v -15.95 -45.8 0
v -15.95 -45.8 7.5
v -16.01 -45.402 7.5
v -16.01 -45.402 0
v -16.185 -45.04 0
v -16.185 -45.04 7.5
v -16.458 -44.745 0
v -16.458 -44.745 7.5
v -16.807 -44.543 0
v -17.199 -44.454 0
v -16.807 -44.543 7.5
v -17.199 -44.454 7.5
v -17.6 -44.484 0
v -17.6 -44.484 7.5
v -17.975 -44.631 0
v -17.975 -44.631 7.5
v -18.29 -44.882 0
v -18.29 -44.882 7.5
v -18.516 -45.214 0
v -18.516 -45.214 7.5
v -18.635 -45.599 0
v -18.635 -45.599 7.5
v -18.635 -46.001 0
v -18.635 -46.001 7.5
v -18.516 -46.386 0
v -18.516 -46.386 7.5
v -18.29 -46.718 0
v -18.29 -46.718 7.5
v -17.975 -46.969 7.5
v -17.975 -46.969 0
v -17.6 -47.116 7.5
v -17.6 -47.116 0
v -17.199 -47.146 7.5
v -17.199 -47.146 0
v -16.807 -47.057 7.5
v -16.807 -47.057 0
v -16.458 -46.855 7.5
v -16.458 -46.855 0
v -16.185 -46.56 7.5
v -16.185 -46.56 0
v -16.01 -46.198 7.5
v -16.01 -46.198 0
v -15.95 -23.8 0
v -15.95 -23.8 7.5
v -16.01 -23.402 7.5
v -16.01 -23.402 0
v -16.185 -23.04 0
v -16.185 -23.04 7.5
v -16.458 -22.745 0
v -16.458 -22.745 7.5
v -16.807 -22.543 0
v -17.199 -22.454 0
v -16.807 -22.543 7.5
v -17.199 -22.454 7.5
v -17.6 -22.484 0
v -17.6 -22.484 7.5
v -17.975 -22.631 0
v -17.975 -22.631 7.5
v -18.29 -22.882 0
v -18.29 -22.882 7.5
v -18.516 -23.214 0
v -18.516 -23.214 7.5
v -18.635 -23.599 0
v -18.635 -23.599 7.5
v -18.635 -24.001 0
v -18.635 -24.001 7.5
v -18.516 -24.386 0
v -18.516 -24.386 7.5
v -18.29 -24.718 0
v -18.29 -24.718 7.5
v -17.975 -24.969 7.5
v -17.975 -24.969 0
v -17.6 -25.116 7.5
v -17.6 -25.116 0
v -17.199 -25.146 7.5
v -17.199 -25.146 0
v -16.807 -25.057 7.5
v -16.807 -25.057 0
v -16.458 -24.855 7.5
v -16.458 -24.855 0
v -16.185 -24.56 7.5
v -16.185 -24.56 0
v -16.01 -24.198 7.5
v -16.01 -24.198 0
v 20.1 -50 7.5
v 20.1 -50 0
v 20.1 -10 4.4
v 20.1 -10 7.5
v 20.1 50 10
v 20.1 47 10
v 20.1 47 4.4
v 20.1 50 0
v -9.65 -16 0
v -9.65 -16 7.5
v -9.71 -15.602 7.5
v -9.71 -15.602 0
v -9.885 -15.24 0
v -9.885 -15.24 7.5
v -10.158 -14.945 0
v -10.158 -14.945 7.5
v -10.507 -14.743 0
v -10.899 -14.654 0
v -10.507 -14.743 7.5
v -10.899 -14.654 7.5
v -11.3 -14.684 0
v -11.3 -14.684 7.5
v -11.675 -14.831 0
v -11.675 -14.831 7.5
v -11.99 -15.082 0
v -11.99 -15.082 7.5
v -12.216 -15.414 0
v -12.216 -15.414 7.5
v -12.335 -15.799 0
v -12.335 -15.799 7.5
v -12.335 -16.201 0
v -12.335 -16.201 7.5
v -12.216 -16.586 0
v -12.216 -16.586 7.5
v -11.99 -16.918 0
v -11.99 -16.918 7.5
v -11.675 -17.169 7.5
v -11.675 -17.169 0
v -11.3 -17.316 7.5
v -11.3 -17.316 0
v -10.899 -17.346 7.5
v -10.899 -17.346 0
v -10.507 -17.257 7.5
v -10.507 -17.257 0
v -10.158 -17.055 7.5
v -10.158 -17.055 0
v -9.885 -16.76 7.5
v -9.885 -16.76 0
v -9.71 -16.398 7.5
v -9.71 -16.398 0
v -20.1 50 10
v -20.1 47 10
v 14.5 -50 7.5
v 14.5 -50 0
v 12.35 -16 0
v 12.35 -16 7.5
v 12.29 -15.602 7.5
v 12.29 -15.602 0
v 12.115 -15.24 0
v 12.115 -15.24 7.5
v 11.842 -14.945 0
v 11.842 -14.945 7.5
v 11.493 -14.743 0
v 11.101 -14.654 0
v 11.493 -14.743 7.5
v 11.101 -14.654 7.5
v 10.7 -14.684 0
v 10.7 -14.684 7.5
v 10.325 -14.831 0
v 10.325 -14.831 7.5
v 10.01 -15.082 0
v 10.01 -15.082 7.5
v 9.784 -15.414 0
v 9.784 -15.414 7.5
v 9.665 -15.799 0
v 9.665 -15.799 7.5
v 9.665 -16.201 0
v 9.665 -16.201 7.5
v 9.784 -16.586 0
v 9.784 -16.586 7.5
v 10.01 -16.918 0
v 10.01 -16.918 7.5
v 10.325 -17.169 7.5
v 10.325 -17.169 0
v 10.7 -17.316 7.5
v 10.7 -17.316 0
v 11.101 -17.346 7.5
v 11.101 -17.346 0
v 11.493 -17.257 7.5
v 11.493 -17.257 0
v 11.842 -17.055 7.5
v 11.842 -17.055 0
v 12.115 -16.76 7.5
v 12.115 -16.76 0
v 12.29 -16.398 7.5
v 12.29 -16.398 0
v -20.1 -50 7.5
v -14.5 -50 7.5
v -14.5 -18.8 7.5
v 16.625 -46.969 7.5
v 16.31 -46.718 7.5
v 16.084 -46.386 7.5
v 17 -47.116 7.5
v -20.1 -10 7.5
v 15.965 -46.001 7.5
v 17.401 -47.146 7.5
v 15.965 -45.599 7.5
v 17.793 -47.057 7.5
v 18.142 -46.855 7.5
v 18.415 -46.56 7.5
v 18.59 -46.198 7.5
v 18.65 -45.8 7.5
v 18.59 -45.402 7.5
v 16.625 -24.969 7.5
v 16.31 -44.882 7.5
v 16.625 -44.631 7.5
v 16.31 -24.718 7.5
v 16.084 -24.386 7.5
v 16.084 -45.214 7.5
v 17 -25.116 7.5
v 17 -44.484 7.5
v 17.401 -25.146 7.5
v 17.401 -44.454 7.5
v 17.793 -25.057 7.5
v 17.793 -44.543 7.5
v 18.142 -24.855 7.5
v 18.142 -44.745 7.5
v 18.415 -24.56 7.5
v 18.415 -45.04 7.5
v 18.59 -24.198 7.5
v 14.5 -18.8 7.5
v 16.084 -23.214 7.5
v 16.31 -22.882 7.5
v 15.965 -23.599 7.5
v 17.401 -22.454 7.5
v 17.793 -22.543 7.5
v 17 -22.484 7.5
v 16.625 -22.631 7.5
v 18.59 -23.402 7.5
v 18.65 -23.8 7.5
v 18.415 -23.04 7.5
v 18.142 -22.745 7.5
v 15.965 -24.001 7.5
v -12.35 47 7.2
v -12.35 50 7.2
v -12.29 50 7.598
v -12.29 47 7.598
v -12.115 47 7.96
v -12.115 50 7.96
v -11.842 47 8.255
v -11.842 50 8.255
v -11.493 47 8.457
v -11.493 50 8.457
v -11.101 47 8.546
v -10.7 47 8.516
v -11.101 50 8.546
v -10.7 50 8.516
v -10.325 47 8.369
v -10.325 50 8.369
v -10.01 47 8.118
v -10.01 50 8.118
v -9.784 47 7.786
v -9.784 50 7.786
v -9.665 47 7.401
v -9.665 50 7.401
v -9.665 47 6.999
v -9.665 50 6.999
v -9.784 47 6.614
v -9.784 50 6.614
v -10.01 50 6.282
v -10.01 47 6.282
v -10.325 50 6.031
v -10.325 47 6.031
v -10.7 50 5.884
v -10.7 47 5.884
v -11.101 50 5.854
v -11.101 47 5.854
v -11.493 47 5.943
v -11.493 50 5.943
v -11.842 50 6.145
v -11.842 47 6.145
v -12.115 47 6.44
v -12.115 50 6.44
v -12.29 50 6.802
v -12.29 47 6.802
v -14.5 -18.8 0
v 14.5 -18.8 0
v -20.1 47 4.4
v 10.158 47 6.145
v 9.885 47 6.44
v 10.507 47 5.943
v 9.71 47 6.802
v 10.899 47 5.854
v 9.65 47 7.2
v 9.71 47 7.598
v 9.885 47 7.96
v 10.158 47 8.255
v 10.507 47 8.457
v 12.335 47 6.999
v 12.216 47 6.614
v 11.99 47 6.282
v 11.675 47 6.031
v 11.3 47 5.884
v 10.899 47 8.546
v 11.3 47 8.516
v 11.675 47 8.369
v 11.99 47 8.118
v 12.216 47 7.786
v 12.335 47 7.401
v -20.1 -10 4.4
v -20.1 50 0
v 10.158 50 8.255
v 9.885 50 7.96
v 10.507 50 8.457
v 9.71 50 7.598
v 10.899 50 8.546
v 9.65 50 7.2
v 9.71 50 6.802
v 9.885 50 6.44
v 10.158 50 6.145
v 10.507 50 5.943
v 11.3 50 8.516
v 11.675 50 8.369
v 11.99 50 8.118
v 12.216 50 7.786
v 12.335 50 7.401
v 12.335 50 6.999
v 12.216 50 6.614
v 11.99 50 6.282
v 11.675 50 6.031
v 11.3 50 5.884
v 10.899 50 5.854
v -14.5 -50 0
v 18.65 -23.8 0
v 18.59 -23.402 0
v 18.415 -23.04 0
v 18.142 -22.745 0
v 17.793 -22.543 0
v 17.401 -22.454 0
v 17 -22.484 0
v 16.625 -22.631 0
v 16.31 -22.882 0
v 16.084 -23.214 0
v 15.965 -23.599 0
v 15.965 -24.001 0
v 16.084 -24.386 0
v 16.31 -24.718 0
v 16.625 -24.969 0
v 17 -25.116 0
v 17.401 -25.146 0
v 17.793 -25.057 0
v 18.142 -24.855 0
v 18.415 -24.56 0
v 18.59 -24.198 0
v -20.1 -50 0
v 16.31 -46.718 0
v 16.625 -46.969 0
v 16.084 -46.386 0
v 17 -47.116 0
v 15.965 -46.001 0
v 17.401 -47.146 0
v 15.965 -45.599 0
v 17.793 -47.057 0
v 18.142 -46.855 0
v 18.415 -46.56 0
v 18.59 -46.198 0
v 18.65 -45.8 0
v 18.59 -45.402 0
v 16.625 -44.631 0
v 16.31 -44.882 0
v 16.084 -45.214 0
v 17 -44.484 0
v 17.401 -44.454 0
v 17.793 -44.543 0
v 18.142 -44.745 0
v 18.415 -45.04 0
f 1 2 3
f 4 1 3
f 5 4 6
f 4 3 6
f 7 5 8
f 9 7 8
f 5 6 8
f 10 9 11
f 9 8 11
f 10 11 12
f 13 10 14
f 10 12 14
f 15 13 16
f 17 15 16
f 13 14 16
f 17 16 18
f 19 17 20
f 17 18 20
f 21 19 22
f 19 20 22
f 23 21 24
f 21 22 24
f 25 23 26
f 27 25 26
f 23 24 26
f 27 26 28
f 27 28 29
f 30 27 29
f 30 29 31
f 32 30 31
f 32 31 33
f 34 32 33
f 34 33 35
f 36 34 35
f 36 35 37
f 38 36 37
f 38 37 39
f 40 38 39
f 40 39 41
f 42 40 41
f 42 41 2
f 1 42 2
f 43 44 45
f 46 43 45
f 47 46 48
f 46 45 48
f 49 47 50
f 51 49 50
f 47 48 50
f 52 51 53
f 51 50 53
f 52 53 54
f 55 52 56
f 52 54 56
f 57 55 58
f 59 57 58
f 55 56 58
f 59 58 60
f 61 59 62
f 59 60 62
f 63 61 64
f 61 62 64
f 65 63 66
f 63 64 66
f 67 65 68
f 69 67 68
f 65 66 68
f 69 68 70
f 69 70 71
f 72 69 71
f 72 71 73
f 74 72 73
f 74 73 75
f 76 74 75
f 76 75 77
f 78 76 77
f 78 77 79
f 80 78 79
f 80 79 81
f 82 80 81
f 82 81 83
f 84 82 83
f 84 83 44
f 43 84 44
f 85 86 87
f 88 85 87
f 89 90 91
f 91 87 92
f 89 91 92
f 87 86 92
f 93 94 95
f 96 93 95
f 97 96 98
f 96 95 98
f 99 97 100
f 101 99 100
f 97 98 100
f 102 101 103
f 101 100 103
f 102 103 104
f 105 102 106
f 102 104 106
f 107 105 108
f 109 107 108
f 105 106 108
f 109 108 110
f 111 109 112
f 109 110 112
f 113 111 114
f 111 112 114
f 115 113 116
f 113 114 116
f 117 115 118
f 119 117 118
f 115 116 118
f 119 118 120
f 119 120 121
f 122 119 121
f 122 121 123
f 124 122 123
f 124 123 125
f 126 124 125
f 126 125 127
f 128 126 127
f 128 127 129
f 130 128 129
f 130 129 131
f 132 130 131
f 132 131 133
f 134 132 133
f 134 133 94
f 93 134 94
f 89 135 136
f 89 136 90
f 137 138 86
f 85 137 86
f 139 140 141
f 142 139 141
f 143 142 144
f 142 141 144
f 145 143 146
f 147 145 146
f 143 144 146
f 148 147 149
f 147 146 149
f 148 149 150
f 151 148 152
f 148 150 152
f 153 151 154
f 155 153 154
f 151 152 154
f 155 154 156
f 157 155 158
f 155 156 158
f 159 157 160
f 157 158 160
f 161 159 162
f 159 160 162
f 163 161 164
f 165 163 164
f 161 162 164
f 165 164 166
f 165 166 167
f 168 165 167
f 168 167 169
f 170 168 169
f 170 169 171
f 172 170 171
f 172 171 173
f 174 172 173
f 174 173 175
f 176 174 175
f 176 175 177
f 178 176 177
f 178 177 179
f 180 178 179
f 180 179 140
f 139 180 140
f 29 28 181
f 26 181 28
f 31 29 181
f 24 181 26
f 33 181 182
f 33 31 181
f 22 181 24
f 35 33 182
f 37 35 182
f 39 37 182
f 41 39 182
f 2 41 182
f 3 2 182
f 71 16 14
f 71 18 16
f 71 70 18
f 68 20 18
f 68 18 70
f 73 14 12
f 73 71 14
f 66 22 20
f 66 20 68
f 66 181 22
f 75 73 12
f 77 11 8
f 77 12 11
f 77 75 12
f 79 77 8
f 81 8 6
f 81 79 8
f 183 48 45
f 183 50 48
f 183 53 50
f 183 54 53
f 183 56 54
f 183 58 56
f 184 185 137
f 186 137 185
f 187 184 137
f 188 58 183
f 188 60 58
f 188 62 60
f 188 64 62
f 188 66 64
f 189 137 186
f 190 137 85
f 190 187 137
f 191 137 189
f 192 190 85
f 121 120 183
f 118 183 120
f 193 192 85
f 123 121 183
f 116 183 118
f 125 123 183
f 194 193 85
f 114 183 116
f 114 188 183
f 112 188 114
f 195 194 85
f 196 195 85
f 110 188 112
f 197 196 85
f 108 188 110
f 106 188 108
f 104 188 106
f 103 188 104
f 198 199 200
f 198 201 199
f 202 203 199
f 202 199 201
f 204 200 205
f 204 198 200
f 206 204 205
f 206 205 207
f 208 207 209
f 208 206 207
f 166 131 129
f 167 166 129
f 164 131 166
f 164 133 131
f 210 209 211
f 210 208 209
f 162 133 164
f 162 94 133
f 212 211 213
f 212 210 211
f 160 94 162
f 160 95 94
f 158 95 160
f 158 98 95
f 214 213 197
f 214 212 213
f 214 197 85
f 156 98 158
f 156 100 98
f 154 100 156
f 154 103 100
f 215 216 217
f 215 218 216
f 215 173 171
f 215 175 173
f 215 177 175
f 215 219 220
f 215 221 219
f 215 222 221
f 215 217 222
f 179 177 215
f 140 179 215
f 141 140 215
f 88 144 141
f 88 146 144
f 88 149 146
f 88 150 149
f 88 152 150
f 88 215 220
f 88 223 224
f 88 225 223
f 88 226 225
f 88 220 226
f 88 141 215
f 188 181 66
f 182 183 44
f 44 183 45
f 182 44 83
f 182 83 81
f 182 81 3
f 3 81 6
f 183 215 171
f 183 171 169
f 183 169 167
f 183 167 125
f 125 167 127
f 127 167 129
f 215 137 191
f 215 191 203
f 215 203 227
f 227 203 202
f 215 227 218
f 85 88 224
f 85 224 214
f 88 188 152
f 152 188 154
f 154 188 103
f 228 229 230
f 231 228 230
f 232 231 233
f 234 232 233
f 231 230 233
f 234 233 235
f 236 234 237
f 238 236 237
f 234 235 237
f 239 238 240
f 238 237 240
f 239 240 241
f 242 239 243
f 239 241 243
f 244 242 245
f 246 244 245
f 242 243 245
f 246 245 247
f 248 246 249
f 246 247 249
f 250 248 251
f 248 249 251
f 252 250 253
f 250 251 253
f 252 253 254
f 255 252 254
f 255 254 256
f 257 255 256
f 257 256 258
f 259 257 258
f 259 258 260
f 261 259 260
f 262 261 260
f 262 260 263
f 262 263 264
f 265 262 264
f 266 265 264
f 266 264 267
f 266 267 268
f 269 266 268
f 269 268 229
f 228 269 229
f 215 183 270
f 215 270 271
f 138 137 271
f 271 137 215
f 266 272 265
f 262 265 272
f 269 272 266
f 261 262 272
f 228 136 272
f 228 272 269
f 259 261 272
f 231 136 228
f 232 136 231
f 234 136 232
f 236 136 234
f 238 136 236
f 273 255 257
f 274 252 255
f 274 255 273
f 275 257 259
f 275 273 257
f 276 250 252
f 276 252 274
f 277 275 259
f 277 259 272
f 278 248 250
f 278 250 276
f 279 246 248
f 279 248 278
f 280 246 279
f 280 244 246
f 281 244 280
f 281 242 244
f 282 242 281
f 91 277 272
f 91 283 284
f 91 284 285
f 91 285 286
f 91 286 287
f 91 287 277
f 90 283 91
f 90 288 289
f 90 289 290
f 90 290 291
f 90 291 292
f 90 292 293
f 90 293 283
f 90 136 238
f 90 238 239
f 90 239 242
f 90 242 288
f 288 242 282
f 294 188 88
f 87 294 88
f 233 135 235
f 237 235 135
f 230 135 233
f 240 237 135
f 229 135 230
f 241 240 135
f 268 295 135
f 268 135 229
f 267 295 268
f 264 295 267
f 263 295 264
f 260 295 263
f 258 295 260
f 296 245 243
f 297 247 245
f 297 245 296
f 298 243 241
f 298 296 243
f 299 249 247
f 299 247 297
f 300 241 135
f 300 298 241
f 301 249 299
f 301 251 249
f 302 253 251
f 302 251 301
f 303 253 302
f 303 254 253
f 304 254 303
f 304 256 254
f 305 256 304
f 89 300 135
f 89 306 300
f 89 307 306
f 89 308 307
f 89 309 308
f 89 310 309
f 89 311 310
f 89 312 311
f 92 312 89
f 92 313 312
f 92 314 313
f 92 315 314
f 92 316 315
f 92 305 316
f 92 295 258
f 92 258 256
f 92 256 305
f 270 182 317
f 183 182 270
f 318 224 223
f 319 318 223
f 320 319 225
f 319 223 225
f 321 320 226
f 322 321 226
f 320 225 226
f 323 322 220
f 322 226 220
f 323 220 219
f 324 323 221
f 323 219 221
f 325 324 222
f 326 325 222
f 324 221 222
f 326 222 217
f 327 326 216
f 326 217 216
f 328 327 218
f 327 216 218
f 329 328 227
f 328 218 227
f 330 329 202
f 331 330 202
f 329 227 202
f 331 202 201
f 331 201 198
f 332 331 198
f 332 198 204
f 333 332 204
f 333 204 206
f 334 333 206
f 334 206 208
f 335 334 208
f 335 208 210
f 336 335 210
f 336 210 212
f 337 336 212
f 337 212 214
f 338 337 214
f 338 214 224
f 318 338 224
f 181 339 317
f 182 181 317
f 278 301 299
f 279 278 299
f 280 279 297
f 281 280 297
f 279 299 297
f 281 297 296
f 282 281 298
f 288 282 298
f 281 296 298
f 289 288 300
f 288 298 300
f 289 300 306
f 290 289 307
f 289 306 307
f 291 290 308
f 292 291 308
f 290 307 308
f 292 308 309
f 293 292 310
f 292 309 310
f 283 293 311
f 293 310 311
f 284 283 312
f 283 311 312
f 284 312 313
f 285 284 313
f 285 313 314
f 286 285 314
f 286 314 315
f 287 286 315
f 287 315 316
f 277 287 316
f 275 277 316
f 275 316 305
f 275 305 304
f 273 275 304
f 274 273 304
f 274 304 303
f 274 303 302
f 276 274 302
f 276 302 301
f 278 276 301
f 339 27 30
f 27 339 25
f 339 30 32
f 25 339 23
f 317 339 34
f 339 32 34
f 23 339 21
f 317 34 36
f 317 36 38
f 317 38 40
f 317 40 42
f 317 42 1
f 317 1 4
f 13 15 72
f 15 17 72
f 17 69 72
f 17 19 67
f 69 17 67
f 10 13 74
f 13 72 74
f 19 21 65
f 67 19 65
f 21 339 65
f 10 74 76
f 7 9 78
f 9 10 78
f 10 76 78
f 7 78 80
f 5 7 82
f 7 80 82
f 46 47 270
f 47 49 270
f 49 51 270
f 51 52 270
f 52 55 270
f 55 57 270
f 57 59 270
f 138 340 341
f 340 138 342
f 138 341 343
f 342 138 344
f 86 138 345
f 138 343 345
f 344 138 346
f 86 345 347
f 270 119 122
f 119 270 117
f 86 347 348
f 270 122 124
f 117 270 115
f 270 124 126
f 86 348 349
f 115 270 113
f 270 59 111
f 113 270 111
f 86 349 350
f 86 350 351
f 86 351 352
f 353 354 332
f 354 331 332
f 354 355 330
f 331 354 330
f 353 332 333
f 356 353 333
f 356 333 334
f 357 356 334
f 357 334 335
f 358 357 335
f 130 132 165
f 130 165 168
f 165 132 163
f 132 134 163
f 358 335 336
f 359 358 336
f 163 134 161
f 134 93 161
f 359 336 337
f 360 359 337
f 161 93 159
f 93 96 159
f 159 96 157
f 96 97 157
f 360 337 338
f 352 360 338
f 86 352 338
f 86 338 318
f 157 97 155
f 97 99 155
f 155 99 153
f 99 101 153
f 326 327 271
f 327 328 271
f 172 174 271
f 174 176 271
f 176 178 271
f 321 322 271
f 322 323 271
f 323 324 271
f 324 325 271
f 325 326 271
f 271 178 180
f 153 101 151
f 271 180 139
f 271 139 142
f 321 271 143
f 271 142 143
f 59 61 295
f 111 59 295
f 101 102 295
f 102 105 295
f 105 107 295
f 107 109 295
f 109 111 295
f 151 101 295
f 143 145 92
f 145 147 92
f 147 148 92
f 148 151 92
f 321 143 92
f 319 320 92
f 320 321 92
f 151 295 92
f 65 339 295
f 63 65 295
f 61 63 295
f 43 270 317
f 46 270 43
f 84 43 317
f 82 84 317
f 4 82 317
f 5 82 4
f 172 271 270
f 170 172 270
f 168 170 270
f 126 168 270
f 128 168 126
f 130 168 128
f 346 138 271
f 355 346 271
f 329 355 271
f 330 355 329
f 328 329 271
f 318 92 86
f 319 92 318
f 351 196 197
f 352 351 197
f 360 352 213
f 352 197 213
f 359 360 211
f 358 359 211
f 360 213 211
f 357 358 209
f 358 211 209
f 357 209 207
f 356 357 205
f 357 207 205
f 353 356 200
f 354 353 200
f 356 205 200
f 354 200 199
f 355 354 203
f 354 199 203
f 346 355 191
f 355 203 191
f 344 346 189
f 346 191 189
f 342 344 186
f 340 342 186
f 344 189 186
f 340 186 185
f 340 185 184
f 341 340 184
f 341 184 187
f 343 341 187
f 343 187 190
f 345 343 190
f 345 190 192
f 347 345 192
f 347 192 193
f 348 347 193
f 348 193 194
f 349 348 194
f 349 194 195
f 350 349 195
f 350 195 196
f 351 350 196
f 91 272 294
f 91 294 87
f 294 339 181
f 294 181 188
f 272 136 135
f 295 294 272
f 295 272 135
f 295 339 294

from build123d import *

# Parameters (mm, degrees)
SKETCH1_W           = 40.2
SKETCH1_H           = 100
BOSS_EXTRUDE1_DEPTH = 10
SKETCH7_W           = 40.2
SKETCH7_H           = 96.8
CUT_EXTRUDE5_DEPTH  = 2.5
SKETCH4_W           = 40.2
SKETCH4_H           = 57
CUT_EXTRUDE1_DEPTH  = 5.6
SKETCH3_W           = 29
SKETCH3_H           = 31.2
CUT_EXTRUDE2_DEPTH  = 11
SKETCH2_R           = 1.35
CUT_EXTRUDE3_DEPTH  = 11
CUT_EXTRUDE4_REACH  = 102
SKETCH6_R           = 1.35


with BuildPart() as part:
    # Sketch1 → Boss-Extrude1 (new body)
    with BuildSketch(Plane.XY):
        Rectangle(SKETCH1_W, SKETCH1_H)
    extrude(amount=BOSS_EXTRUDE1_DEPTH)

    # Sketch7 → Cut-Extrude5 (cut)
    with BuildSketch(Plane.XY.offset(10)):
        with Locations((0, -1.6)):
            Rectangle(SKETCH7_W, SKETCH7_H)
    extrude(amount=-CUT_EXTRUDE5_DEPTH, mode=Mode.SUBTRACT)

    # Sketch4 → Cut-Extrude1 (cut)
    with BuildSketch(Plane.XY.offset(10)):
        with Locations((0, 18.5)):
            Rectangle(SKETCH4_W, SKETCH4_H)
    extrude(amount=-CUT_EXTRUDE1_DEPTH, mode=Mode.SUBTRACT)

    # Sketch3 → Cut-Extrude2 (cut, through all)
    with BuildSketch(Plane.XY.offset(10)):
        with Locations((0, -34.4)):
            Rectangle(SKETCH3_W, SKETCH3_H)
    extrude(amount=-CUT_EXTRUDE2_DEPTH, mode=Mode.SUBTRACT)

    # Sketch2 → Cut-Extrude3 (cut, through all)
    with BuildSketch(Plane.XY.offset(10)):
        with Locations((17.3, -23.8)):
            Circle(SKETCH2_R)
        with Locations((11, -16)):
            Circle(SKETCH2_R)
        with Locations((-17.3, -23.8)):
            Circle(SKETCH2_R)
        with Locations((-11, -16)):
            Circle(SKETCH2_R)
        with Locations((-17.3, -45.8)):
            Circle(SKETCH2_R)
        with Locations((17.3, -45.8)):
            Circle(SKETCH2_R)
    extrude(amount=-CUT_EXTRUDE3_DEPTH, mode=Mode.SUBTRACT)

    # Sketch6 → Cut-Extrude4 (cut, up to next)
    with BuildSketch(Plane(origin=(0, 50, 0), x_dir=(-1, 0, 0), z_dir=(0, 1, 0)), mode=Mode.PRIVATE) as cut_extrude4_sk1:
        with Locations((-11, 7.2)):
            Circle(SKETCH6_R)
    cut_extrude4_tool1 = extrude(cut_extrude4_sk1.sketch, amount=-CUT_EXTRUDE4_REACH, mode=Mode.PRIVATE) & part.part
    add(cut_extrude4_tool1.solids().sort_by_distance((11, 50, 7.2))[0], mode=Mode.SUBTRACT)
    # Sketch6 → Cut-Extrude4 (cut, up to next)
    with BuildSketch(Plane(origin=(0, 50, 0), x_dir=(-1, 0, 0), z_dir=(0, 1, 0)), mode=Mode.PRIVATE) as cut_extrude4_sk2:
        with Locations((11, 7.2)):
            Circle(SKETCH6_R)
    cut_extrude4_tool2 = extrude(cut_extrude4_sk2.sketch, amount=-CUT_EXTRUDE4_REACH, mode=Mode.PRIVATE) & part.part
    add(cut_extrude4_tool2.solids().sort_by_distance((-11, 50, 7.2))[0], mode=Mode.SUBTRACT)


solid = part.part
